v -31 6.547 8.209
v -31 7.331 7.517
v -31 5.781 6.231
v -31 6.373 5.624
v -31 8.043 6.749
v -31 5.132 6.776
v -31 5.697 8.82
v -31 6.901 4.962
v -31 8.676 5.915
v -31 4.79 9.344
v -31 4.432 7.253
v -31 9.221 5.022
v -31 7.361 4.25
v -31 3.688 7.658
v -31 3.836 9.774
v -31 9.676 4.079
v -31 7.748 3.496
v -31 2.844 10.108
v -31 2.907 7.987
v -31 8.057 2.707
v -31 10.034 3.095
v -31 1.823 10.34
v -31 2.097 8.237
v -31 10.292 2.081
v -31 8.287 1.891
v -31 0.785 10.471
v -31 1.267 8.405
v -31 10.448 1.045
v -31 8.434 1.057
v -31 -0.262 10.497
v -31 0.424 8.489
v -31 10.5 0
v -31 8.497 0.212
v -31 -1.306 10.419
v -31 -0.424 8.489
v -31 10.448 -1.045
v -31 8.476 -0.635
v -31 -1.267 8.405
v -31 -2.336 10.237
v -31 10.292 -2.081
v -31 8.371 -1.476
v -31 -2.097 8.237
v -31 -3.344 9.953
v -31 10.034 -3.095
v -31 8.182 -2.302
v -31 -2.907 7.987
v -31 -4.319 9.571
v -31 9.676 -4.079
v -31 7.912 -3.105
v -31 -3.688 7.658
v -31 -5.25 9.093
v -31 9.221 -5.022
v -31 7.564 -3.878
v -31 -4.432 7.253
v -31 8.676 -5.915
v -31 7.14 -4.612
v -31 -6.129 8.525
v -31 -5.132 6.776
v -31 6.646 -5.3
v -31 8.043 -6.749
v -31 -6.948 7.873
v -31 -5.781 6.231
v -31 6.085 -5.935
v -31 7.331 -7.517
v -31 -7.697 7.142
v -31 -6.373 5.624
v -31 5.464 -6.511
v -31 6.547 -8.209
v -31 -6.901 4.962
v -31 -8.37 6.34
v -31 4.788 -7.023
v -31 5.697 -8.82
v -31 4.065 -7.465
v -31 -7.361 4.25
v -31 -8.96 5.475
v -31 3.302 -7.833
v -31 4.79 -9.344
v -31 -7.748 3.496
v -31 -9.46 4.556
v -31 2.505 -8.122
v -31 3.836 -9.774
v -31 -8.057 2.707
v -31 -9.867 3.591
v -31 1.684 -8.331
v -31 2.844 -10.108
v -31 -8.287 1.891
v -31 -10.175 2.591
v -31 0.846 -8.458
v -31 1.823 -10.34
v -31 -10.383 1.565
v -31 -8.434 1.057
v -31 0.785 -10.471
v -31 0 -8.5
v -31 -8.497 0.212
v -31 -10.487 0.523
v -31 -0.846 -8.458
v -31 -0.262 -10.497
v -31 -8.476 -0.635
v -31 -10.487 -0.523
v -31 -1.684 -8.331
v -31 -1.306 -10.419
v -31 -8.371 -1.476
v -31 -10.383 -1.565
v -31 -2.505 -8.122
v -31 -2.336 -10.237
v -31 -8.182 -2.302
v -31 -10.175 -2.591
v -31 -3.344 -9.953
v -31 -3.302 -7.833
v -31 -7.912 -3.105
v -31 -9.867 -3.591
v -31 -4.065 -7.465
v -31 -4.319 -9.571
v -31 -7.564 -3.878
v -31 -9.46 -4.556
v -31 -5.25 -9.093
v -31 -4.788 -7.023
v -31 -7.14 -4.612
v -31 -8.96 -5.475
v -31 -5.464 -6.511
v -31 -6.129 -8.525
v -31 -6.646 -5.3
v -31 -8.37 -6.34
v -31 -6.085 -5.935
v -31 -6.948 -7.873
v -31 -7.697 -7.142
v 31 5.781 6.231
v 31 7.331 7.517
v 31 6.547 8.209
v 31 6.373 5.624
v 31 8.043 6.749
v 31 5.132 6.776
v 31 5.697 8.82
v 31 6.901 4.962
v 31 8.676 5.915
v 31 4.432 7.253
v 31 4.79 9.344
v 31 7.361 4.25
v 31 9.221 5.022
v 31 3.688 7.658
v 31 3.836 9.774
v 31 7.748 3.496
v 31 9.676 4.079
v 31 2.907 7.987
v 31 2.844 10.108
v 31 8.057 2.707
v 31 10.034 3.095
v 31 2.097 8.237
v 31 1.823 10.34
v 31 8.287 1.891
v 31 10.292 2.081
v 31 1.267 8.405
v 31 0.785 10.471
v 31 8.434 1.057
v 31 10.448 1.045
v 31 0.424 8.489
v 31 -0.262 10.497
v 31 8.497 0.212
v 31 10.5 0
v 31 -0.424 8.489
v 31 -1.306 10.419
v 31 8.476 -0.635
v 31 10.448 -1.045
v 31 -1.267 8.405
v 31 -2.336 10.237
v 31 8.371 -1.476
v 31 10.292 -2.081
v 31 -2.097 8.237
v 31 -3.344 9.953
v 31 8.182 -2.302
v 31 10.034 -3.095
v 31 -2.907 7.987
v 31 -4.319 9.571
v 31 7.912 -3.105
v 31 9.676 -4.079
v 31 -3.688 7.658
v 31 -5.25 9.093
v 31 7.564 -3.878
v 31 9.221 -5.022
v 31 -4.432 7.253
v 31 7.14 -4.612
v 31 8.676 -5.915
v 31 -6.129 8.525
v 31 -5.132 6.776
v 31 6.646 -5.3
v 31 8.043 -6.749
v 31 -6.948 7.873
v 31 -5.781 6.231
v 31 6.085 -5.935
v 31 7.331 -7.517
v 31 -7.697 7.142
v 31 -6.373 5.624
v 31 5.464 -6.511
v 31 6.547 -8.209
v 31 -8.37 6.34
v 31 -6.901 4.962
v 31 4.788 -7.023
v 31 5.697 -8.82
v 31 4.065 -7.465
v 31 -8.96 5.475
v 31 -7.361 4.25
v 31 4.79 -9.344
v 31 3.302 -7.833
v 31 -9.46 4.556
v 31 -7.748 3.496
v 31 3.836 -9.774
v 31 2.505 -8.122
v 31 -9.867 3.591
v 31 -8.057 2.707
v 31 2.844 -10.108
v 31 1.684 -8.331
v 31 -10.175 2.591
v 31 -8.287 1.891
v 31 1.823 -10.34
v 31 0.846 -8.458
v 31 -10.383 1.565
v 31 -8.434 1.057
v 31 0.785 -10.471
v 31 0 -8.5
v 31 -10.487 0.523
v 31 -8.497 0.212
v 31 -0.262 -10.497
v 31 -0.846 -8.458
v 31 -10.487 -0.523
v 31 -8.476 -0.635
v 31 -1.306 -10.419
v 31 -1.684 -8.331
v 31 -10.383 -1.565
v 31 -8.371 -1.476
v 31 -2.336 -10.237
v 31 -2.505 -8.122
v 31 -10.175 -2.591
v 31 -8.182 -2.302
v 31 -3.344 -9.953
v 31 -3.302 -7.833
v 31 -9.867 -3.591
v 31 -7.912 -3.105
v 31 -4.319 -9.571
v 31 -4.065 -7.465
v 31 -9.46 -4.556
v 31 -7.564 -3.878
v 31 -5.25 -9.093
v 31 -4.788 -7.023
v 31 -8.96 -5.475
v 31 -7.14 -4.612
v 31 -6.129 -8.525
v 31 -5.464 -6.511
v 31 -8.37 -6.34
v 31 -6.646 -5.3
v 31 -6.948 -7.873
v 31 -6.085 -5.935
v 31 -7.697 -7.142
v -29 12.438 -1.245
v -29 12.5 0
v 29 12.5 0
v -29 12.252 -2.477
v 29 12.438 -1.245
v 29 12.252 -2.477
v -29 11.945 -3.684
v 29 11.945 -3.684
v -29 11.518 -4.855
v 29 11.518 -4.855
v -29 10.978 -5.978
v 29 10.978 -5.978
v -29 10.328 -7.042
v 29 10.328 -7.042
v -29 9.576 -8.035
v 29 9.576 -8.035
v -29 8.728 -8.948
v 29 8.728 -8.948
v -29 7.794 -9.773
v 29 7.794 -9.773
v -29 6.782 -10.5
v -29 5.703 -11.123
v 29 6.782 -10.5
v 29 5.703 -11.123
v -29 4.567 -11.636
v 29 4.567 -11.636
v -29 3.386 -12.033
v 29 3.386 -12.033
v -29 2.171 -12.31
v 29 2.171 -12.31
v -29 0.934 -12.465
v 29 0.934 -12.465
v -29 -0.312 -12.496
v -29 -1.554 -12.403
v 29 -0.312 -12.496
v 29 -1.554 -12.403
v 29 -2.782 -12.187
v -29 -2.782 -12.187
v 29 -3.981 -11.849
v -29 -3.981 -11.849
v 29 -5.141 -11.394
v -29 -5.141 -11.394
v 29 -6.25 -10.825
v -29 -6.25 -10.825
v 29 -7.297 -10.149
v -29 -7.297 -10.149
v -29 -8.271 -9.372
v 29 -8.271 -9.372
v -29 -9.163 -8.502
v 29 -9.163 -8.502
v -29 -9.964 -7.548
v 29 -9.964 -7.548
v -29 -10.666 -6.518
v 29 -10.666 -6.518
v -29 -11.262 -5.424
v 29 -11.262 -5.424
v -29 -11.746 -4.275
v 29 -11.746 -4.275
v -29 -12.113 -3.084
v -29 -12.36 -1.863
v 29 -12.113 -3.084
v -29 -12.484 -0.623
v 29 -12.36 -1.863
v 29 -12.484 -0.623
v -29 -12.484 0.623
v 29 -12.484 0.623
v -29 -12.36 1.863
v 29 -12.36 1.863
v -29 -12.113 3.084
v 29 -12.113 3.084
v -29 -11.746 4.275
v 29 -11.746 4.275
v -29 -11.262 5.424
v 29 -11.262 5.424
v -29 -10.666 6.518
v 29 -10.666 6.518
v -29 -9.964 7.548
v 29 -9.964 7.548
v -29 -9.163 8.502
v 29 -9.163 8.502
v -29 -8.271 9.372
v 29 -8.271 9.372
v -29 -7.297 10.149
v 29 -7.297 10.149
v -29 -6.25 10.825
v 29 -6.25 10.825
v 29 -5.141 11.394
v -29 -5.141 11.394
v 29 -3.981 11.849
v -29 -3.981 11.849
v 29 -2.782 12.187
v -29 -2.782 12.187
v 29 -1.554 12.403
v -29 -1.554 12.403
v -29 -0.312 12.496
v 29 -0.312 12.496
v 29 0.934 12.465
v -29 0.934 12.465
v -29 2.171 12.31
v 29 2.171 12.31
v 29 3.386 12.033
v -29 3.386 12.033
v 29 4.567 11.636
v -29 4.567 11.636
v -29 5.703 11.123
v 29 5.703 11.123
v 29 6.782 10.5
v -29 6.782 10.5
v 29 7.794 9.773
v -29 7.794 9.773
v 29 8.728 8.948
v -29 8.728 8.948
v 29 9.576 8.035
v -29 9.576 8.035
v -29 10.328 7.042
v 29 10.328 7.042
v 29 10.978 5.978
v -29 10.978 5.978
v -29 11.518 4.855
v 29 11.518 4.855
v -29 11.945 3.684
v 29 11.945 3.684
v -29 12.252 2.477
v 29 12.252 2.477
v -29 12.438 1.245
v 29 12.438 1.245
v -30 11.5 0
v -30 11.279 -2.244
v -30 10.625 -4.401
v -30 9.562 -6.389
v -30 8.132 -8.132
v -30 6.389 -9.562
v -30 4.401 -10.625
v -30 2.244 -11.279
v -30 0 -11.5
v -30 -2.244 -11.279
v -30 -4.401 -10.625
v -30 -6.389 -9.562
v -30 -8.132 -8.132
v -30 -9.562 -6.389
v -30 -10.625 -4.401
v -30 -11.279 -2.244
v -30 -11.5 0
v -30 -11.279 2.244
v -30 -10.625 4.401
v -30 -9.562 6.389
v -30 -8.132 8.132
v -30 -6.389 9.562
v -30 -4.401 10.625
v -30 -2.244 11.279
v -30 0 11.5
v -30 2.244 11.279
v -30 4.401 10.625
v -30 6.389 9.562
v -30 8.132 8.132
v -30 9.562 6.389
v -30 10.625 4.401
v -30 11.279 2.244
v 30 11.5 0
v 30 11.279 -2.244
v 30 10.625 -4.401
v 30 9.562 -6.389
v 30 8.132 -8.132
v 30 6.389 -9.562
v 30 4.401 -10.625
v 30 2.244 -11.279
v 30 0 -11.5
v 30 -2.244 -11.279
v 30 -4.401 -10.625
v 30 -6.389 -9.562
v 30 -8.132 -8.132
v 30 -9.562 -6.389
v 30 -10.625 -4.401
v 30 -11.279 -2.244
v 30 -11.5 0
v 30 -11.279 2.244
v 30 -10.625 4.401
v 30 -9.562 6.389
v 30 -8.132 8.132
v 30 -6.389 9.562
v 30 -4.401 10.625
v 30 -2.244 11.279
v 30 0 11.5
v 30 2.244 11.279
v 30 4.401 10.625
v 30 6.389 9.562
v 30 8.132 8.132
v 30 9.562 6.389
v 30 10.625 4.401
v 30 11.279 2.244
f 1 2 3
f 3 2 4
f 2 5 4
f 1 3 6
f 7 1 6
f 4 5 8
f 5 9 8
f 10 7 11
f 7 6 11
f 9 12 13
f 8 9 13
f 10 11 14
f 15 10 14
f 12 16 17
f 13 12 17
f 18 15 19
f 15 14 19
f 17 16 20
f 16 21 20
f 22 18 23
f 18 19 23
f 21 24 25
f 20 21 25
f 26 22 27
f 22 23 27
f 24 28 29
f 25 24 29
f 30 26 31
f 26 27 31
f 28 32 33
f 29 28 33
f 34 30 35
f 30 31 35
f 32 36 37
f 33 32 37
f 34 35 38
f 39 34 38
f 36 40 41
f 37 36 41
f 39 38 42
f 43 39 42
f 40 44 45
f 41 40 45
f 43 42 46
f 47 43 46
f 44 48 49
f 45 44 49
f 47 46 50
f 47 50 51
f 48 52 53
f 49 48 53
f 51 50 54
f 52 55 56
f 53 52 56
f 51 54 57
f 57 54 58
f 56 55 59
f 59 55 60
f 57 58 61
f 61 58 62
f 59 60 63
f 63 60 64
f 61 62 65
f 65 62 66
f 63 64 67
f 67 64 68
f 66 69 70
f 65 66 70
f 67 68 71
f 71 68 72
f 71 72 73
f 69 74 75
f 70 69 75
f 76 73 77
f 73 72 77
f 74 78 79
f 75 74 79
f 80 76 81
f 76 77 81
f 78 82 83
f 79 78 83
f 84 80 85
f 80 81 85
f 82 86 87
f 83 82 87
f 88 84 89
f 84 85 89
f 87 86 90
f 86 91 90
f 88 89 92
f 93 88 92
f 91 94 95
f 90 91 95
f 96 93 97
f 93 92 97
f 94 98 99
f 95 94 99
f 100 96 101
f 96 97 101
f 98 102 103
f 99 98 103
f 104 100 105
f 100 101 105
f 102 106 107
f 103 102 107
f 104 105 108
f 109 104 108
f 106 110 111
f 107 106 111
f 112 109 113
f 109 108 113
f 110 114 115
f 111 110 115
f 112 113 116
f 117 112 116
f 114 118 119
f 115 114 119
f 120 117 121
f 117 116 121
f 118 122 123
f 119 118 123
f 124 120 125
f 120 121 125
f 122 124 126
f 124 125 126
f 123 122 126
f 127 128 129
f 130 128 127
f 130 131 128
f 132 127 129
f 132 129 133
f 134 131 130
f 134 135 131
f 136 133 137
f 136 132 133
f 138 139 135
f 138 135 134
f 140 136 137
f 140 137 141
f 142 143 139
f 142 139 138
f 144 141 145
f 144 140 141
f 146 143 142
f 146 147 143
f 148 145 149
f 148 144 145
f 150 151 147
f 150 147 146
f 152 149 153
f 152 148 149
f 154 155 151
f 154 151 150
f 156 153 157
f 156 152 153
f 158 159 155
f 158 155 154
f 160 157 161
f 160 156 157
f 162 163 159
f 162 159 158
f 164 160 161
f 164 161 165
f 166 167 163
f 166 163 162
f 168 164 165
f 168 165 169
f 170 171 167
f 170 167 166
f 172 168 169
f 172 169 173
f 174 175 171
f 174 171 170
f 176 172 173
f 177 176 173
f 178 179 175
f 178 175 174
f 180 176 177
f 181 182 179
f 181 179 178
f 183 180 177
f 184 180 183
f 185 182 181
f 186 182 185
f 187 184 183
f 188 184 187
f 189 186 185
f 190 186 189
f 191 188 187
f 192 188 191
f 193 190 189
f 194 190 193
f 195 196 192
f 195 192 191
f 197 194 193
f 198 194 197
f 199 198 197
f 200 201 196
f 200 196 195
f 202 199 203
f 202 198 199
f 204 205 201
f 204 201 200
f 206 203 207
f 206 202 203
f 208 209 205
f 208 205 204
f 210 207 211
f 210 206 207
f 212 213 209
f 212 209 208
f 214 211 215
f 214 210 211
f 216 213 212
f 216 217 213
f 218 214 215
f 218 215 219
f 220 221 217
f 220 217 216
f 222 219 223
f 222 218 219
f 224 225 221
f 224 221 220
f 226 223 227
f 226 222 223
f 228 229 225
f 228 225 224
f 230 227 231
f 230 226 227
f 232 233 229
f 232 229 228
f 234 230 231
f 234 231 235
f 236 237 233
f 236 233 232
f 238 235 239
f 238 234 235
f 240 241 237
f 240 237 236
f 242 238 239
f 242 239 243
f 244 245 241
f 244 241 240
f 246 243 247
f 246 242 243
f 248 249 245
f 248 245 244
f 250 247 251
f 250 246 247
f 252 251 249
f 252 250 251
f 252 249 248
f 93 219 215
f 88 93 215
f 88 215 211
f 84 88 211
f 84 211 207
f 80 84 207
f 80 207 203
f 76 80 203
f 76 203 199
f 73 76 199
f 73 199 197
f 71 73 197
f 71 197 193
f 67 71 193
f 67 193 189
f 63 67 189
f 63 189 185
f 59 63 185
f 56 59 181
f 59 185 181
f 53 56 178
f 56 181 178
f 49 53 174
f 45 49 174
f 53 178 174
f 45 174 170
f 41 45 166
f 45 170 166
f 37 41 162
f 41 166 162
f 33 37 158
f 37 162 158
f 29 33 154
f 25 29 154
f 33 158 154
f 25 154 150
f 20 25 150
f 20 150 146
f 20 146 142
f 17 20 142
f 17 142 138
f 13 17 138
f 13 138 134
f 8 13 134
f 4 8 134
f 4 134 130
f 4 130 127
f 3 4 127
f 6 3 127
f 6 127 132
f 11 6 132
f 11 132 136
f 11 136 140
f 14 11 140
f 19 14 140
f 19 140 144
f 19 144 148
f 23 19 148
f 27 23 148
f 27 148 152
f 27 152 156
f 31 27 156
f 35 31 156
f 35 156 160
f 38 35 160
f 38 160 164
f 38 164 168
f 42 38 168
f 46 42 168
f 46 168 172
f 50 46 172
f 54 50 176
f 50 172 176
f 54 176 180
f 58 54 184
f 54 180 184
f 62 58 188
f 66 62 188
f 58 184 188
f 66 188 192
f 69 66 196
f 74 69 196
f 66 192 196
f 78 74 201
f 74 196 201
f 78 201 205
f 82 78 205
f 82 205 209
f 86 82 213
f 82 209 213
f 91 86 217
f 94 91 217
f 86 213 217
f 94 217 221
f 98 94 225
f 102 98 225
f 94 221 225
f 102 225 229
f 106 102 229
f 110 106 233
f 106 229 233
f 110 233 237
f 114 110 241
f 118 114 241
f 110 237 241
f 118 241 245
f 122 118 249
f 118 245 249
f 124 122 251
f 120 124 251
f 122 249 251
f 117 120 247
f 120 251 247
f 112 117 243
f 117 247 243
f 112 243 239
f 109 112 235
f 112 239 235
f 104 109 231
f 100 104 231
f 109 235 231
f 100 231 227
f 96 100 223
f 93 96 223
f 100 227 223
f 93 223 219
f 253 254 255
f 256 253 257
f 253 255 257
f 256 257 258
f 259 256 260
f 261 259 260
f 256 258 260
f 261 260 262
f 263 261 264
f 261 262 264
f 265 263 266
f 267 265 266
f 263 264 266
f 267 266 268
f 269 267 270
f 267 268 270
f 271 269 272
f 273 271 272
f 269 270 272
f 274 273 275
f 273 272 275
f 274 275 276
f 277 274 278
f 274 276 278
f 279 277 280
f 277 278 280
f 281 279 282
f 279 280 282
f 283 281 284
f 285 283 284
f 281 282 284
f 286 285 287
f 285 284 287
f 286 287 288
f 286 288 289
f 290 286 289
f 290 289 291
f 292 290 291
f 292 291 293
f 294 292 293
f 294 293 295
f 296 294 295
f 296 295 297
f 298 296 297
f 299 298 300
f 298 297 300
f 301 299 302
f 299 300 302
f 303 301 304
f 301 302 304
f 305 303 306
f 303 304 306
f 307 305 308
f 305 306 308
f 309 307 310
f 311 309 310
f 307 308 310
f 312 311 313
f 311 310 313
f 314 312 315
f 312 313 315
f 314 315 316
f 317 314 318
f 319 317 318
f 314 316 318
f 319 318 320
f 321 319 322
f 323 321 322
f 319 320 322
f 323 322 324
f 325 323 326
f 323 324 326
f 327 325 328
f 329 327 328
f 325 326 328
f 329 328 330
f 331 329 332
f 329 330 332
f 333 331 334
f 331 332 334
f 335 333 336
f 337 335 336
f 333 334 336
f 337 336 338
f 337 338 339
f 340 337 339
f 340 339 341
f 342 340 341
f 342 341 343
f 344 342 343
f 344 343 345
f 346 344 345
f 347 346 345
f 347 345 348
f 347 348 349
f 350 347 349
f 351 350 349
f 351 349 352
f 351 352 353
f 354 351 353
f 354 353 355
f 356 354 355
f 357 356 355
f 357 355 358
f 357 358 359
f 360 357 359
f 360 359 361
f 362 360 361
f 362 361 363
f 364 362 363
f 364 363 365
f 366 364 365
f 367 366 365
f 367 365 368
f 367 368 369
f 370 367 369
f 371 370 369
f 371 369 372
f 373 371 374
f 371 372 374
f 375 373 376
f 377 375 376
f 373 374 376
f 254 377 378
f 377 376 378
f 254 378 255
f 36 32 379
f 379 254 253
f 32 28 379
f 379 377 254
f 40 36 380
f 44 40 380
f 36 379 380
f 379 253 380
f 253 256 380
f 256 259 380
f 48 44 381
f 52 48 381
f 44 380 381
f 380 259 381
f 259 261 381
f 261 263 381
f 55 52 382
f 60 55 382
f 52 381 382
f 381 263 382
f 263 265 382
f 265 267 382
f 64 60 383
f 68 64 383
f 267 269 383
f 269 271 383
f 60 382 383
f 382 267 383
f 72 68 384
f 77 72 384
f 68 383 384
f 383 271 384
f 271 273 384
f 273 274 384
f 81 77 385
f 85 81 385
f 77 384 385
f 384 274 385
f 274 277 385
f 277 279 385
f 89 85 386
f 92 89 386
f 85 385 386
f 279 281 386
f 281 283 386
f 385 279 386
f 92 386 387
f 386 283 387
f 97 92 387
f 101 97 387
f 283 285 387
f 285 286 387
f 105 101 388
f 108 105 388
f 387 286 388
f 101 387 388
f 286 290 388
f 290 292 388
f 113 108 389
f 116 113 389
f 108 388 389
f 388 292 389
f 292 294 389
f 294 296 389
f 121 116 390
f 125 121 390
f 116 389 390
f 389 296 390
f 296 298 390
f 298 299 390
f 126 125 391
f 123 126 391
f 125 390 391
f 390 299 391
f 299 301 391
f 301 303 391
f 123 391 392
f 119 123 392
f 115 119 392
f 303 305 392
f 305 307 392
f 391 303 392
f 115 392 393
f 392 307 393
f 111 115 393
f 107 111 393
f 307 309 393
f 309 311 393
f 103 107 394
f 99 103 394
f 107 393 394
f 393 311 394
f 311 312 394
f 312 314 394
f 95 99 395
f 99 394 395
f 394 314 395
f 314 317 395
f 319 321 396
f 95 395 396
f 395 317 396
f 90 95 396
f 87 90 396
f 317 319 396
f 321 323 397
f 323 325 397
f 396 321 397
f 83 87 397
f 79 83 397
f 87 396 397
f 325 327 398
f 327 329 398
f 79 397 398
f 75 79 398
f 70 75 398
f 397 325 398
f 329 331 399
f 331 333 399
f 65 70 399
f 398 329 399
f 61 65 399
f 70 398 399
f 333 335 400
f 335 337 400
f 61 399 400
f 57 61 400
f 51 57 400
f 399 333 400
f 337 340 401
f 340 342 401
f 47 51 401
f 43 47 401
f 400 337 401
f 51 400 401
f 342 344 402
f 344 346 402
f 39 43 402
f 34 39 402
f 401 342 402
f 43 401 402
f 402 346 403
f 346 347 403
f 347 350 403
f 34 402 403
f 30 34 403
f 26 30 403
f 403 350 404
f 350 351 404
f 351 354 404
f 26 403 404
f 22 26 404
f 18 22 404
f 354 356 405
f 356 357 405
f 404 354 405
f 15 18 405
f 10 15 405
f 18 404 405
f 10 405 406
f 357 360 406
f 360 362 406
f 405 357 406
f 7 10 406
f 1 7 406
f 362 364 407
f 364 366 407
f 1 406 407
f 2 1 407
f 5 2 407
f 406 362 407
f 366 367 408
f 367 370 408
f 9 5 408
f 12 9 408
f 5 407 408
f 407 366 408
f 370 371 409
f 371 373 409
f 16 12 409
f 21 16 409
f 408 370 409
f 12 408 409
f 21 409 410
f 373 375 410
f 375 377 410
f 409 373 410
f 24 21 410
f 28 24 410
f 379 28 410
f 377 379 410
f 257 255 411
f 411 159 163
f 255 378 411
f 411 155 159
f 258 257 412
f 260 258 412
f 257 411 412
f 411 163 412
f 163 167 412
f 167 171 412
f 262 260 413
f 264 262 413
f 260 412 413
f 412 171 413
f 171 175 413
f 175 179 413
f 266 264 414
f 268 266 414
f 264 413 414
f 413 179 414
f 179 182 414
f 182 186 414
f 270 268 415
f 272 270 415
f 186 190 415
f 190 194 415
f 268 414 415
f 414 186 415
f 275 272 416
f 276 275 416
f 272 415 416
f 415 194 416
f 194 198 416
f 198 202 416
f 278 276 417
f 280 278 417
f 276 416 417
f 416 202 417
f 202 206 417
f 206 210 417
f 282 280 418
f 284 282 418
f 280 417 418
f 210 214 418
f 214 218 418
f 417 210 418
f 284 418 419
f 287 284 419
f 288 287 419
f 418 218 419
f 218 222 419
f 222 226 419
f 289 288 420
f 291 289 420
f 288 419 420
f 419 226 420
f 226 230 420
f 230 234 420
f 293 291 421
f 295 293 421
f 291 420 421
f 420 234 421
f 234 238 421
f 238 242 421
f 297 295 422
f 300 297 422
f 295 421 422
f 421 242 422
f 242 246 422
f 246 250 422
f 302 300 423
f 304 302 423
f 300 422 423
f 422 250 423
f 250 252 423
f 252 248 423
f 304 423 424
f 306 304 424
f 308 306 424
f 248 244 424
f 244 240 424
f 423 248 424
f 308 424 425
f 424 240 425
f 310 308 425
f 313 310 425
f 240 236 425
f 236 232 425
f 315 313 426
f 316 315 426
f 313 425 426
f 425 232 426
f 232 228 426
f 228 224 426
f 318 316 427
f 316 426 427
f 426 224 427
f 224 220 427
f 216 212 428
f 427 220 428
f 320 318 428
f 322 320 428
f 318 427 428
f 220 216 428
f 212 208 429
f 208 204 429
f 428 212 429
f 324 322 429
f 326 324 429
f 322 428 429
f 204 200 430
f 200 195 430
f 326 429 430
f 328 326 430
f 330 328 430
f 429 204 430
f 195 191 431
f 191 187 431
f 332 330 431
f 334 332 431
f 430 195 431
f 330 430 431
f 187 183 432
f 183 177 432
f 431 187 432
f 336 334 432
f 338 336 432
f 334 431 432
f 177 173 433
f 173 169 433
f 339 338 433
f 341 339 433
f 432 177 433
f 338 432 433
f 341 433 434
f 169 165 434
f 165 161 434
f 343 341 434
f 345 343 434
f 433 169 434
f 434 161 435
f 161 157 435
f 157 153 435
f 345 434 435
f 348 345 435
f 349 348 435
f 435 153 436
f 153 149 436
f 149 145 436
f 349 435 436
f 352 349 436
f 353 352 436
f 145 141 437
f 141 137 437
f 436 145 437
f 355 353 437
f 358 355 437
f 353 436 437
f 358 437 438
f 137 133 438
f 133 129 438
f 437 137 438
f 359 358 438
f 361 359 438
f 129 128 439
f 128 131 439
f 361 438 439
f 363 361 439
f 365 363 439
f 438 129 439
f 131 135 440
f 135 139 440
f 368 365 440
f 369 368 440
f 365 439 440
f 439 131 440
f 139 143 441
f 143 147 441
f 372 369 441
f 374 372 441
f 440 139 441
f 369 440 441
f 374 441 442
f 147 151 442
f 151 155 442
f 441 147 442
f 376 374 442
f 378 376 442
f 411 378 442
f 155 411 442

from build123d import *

# Parameters (mm, degrees)
SKETCH1_W          = 62
SKETCH1_H          = 12.5
SKETCH2_R          = 8.5
CUT_EXTRUDE1_DEPTH = 63
CHAMFER2_SIZE      = 2


with BuildPart() as part:
    # Sketch1 → Revolve1 (revolve)
    with BuildSketch(Plane.XY):
        with Locations((0, 6.25)):
            Rectangle(SKETCH1_W, SKETCH1_H)
    revolve(axis=Axis((31, 0, 0), (-1, 0, 0)))

    # Sketch2 → Cut-Extrude1 (cut, through all)
    with BuildSketch(Plane(origin=(31, 0, 0), x_dir=(0, 0, -1), z_dir=(1, 0, 0))):
        Circle(SKETCH2_R)
    extrude(amount=-CUT_EXTRUDE1_DEPTH, mode=Mode.SUBTRACT)

    # Chamfer2
    chamfer2_edges = [part.edges().sort_by_distance(p)[0] for p in [
        (31, -12.5, 0),
        (-31, -12.5, 0),
    ]]
    chamfer(chamfer2_edges, length=CHAMFER2_SIZE)


solid = part.part
